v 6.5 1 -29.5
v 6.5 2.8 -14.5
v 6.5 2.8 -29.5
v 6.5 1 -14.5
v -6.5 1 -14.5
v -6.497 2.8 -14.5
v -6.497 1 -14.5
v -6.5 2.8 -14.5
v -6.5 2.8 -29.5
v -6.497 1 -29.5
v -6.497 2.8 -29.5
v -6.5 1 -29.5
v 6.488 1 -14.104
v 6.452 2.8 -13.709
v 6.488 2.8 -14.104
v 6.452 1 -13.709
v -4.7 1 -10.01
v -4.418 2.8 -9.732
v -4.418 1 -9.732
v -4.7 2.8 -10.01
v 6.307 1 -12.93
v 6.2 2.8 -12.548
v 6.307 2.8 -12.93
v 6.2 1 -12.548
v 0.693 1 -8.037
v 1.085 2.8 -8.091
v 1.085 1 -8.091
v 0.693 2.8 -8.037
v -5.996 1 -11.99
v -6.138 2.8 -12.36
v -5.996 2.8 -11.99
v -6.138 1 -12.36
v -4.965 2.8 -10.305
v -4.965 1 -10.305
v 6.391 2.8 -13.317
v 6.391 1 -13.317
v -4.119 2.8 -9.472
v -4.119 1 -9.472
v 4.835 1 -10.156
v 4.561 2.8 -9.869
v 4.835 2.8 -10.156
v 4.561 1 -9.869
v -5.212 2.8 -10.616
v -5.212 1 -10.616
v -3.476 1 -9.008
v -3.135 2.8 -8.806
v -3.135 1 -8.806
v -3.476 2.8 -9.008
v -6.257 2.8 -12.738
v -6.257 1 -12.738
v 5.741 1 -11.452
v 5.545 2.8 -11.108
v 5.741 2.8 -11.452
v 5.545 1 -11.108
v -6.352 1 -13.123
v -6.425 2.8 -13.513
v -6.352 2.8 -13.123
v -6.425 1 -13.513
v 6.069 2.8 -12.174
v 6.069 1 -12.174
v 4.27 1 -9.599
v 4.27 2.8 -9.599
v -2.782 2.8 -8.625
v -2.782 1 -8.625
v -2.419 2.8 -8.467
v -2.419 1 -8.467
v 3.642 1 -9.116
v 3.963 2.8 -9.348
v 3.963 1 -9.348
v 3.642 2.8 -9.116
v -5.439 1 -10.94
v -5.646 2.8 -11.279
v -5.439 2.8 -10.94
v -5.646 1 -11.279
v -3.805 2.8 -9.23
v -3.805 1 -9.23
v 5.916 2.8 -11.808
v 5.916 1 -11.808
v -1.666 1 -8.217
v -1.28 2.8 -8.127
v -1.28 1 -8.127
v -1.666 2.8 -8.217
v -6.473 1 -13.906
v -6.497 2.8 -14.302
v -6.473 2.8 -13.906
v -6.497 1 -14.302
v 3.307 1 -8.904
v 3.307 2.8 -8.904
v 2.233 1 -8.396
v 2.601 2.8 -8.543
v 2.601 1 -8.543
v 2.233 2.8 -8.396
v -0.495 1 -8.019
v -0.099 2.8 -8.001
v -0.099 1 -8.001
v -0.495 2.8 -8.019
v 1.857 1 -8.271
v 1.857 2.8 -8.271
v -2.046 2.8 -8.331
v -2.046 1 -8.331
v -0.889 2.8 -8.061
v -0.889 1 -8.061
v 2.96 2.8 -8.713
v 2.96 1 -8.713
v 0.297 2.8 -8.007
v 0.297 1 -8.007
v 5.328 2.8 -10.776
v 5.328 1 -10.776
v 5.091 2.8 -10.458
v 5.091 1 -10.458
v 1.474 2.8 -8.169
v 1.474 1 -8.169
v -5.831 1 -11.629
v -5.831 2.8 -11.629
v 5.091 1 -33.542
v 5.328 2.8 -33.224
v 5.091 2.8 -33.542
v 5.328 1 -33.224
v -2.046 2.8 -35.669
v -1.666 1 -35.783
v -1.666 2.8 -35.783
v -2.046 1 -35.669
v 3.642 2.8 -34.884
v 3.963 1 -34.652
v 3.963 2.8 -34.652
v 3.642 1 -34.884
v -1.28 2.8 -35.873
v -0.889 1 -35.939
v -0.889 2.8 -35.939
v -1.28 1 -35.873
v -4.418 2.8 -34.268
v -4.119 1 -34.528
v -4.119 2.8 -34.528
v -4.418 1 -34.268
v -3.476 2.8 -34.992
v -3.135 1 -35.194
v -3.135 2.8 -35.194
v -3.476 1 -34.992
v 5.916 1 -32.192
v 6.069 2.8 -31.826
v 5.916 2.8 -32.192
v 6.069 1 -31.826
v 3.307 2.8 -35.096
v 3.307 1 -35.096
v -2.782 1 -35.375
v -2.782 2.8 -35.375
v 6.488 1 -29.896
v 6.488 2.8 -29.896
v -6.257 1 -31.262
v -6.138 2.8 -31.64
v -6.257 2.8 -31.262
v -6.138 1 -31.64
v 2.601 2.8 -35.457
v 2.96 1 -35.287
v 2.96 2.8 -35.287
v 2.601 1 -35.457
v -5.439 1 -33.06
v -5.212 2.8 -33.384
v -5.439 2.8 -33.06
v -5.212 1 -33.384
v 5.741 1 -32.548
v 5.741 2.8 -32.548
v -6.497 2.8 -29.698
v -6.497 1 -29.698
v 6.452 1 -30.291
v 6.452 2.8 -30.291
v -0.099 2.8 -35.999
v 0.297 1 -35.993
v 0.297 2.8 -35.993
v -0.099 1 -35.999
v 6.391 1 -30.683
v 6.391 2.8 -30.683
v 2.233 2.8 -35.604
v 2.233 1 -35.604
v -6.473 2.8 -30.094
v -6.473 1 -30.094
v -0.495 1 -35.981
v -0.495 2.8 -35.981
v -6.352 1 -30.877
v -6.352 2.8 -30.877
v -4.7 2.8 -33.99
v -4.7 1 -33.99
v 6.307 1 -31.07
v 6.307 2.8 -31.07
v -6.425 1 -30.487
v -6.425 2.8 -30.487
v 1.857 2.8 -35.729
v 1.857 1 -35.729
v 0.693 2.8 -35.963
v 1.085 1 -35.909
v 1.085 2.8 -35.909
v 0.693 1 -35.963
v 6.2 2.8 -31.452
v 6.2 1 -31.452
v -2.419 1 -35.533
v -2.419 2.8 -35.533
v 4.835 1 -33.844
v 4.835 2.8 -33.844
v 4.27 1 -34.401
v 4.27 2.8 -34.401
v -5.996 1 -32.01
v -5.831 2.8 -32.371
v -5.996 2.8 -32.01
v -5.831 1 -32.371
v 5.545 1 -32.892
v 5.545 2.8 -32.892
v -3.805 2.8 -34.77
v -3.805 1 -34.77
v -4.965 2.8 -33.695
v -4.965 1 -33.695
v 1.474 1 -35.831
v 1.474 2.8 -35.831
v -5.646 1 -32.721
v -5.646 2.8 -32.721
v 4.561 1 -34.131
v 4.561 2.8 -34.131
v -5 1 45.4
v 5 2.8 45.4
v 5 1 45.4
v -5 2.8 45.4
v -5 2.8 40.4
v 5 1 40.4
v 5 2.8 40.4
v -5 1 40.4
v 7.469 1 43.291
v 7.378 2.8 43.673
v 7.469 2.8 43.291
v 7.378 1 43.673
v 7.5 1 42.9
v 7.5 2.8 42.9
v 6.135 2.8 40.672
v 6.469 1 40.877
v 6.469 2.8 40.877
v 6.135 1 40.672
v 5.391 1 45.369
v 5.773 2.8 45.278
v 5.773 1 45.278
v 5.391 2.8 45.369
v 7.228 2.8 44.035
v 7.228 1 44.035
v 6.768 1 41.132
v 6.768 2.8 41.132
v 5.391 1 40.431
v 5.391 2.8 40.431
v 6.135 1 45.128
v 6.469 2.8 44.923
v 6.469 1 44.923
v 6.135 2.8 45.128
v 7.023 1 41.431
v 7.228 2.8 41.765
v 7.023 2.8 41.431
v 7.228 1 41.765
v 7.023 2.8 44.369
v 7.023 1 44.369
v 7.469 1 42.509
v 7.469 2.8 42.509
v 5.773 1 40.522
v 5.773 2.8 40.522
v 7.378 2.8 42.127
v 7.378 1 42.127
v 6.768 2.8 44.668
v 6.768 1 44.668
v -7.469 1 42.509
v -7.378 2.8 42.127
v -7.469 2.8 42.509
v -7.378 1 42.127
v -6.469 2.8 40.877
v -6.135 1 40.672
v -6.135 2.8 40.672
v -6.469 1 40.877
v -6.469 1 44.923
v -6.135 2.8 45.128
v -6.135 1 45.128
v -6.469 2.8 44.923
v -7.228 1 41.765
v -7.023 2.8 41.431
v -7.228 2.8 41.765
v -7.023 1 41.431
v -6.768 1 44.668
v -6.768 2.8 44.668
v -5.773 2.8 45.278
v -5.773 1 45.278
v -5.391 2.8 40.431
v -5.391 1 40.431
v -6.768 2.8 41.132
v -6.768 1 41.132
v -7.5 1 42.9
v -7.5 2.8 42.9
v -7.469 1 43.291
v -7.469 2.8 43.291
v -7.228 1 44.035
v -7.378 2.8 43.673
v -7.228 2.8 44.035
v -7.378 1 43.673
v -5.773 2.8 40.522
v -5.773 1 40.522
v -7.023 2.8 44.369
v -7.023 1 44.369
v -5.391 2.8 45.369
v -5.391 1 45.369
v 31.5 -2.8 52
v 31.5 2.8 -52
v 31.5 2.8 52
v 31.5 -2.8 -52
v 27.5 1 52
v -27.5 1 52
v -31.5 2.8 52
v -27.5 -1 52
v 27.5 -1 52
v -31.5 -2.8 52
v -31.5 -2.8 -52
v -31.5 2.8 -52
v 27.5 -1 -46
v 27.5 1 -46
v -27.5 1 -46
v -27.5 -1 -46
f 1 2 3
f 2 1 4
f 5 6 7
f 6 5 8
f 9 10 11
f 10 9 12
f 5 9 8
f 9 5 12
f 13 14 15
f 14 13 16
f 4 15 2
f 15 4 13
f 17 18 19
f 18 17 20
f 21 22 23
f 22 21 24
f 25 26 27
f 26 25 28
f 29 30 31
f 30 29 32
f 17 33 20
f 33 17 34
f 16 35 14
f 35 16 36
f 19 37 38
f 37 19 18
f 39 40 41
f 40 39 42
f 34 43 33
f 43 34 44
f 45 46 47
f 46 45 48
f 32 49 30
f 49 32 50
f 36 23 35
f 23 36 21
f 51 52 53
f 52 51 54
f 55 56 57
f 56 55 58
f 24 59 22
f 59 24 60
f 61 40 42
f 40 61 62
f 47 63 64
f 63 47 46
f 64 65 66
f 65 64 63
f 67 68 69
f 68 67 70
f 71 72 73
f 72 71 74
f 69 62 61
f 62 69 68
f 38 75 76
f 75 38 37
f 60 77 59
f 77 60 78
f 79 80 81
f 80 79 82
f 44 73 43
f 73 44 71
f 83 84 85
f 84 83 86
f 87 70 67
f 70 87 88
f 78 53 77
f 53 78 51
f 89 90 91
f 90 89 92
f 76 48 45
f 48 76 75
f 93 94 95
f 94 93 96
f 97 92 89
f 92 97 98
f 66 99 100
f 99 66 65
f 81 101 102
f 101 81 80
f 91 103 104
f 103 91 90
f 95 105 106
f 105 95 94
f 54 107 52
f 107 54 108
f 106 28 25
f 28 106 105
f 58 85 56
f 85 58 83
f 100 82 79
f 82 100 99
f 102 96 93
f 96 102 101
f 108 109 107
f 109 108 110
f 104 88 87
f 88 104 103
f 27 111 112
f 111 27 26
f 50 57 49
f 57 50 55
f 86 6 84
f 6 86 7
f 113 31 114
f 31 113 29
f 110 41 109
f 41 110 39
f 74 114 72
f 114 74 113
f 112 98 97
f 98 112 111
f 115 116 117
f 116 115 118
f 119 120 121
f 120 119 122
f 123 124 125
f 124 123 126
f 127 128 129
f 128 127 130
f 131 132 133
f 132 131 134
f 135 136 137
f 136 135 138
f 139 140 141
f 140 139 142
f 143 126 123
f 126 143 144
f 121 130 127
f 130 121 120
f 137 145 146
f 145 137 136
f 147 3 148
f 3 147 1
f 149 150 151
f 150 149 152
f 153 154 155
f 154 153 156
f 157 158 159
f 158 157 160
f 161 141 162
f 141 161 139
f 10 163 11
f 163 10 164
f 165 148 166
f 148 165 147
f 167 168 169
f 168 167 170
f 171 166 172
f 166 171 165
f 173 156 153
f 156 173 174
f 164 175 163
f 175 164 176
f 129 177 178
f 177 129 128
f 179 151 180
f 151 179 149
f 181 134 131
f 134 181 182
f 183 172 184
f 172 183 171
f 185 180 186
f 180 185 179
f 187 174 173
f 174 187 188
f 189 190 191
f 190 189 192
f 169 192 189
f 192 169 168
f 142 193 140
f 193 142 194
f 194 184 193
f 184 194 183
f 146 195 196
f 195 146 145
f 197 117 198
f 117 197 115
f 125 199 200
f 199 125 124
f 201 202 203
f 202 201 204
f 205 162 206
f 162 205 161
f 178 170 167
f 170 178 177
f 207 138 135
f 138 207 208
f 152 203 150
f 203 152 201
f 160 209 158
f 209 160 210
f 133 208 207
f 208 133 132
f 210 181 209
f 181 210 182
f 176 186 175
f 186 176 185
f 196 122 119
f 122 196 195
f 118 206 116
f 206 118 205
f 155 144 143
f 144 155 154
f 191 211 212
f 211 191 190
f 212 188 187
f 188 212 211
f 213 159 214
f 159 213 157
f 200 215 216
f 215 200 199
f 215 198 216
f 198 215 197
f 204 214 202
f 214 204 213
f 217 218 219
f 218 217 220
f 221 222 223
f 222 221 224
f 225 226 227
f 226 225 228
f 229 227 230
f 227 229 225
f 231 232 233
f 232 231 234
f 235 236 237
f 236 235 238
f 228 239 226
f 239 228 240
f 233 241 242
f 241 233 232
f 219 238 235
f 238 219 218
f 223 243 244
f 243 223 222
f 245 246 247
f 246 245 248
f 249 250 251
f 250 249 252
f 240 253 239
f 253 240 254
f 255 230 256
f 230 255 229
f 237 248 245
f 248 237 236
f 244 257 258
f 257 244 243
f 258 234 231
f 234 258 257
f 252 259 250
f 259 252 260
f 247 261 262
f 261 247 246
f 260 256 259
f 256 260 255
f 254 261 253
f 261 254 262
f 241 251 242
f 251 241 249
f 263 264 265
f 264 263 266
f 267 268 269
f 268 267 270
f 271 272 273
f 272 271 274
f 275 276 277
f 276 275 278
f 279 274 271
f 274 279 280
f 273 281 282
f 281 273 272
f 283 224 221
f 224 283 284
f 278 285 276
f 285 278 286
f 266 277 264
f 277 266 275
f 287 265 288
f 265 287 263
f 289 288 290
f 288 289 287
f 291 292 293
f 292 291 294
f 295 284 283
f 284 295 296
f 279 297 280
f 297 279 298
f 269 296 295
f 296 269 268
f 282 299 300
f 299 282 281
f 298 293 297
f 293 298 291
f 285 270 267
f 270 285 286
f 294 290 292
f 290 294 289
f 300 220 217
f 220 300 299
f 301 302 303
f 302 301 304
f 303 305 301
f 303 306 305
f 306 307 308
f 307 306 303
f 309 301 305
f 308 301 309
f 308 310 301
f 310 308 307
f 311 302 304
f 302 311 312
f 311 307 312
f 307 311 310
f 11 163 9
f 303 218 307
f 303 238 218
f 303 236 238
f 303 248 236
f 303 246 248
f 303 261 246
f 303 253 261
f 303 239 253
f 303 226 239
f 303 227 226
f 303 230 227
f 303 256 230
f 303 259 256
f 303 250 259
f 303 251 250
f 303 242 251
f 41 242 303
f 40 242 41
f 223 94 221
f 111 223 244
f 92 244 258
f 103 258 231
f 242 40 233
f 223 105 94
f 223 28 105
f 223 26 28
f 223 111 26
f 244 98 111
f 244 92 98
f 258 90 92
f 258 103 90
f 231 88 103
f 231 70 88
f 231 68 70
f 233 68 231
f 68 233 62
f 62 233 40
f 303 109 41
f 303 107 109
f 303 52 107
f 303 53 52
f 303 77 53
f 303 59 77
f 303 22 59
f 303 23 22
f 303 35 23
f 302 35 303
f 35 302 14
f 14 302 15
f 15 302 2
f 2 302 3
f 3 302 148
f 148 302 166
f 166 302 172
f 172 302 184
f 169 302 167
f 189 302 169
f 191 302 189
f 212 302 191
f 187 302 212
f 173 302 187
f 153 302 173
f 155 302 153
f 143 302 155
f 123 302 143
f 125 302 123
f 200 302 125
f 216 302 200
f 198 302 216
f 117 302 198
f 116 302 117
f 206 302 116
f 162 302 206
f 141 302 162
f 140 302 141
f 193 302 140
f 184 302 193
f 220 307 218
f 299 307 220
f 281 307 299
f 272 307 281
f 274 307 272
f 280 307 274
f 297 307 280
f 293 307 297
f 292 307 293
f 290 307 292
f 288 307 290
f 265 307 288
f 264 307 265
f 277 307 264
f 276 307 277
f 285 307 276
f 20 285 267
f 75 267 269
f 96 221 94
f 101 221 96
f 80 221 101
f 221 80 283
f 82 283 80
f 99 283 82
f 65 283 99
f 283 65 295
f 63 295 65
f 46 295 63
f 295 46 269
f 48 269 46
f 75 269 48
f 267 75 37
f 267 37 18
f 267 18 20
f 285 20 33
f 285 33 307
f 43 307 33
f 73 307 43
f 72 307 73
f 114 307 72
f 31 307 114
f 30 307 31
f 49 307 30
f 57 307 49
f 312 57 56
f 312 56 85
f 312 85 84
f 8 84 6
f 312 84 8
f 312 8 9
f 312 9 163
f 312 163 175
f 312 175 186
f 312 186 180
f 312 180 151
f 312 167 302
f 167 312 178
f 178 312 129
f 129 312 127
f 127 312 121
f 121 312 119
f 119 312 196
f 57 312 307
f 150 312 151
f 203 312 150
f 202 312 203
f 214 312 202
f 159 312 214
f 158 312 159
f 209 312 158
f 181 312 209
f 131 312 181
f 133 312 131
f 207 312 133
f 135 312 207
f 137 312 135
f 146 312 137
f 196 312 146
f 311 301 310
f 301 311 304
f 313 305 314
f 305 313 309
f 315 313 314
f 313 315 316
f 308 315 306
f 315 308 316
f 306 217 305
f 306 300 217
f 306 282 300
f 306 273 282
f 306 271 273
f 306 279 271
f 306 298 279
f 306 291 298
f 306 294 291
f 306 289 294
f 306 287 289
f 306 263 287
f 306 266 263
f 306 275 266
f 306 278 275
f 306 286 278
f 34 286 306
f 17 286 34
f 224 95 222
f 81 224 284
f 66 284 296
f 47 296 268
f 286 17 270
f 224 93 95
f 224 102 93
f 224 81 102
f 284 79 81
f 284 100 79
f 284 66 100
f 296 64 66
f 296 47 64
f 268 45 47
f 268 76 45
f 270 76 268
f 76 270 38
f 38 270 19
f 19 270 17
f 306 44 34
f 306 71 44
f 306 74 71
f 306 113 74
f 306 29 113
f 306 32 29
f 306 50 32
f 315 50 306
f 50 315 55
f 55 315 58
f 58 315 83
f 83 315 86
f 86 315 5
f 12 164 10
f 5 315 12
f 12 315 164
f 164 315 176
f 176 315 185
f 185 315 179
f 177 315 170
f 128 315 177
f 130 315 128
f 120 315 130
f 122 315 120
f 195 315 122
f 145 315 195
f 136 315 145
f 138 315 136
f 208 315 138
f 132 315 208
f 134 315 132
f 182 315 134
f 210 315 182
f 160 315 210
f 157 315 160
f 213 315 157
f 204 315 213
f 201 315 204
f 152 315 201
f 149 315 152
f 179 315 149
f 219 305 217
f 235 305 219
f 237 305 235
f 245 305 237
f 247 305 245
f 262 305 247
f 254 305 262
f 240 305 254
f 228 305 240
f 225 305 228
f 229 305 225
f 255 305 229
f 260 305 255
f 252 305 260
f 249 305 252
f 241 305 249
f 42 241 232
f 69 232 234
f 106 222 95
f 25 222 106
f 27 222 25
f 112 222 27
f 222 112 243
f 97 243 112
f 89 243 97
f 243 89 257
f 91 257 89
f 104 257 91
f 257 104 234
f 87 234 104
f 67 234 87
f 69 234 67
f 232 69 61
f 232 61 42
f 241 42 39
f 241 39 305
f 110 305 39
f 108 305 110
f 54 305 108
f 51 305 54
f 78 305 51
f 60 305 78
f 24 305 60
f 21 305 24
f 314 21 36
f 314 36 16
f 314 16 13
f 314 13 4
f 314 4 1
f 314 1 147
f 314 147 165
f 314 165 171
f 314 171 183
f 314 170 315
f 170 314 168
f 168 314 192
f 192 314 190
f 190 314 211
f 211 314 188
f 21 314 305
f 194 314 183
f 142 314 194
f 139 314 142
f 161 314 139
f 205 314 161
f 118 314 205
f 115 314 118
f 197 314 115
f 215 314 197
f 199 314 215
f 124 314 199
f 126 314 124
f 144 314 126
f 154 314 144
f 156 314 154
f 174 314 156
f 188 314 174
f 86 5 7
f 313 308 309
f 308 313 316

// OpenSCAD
// file: BOSL2/std.scad
// Minimal BOSL2 compatibility shim for bundled gallery models.
// It implements only the helpers used by the imported OpenSCAD projects.

CENTER = [0, 0, 0];
BOTTOM = [0, 0, -1];
TOP = [0, 0, 1];
LEFT = [-1, 0, 0];
RIGHT = [1, 0, 0];
FRONT = [0, -1, 0];
BACK = [0, 1, 0];

module up(z=0) {
    translate([0, 0, z]) children();
}

module down(z=0) {
    translate([0, 0, -z]) children();
}

module attach(anchor=CENTER) {
    children();
}

module cuboid(size=[1, 1, 1], anchor=CENTER) {
    center = anchor == CENTER;
    translate(center ? [0, 0, 0] : [0, 0, size[2] / 2])
        cube(size, center=true);
    children();
}

module xcyl(h=1, r=1, anchor=CENTER) {
    center = anchor == CENTER;
    translate(center ? [0, 0, 0] : [h / 2, 0, 0])
        rotate([0, 90, 0])
            cylinder(h=h, r=r, center=true);
}
// main file
include <BOSL2/std.scad>

$fa = 1;
$fs = 0.4;

// Card parameter is only for reference not used.
// card_height=54;
// card_width=86;
// card_thick=1;

holder_internal_height=100;
holder_internal_width=55;
holder_internal_thick=2;
material_thick=1.8;
holder_side_thick=4;
holder_width=holder_internal_width + holder_side_thick * 2;
holder_height=holder_internal_height+holder_side_thick;
holder_thick=holder_internal_thick + material_thick*2;
notch_width=15;
notch_height=5;
notch_cube_width=notch_width - notch_height;
notch_from_top=4.6;
pullout_width=13;
pullout_height=28;
pullout_cube_height=pullout_height - pullout_width;
pullout_from_internal_bottom=10;

difference() {
    cuboid([holder_width, holder_thick, holder_height], rounding=holder_thick/2);
    translate([0, 0, holder_side_thick])
        cube([holder_internal_width, holder_internal_thick, holder_internal_height], center = true);
    
    translate([0, (holder_internal_thick+material_thick)/2, -(holder_internal_height-pullout_height)/2 + holder_side_thick + pullout_from_internal_bottom])
    union() {
        cube([pullout_width, material_thick + 0.02, pullout_cube_height], center=true);
        translate([0, 0, pullout_cube_height/2])
            rotate([90, 0, 0])
            cylinder(h=material_thick + 0.02, d=pullout_width, center=true);
        translate([0, 0, -pullout_cube_height/2])
            rotate([90, 0, 0])
            cylinder(h=material_thick + 0.02, d=pullout_width, center=true);
    }
    translate([0, (holder_internal_thick+material_thick)/2, (holder_internal_height-notch_height)/2 - notch_from_top])
    union() {
        cube([notch_cube_width, material_thick + 0.02, notch_height], center=true);
        translate([notch_cube_width/2, 0, 0])
            rotate([90, 0, 0])
            cylinder(h=material_thick + 0.02, d=notch_height, center=true);
        translate([-notch_cube_width/2, 0, 0])
            rotate([90, 0, 0])
            cylinder(h=material_thick + 0.02, d=notch_height, center=true);
    }
}
